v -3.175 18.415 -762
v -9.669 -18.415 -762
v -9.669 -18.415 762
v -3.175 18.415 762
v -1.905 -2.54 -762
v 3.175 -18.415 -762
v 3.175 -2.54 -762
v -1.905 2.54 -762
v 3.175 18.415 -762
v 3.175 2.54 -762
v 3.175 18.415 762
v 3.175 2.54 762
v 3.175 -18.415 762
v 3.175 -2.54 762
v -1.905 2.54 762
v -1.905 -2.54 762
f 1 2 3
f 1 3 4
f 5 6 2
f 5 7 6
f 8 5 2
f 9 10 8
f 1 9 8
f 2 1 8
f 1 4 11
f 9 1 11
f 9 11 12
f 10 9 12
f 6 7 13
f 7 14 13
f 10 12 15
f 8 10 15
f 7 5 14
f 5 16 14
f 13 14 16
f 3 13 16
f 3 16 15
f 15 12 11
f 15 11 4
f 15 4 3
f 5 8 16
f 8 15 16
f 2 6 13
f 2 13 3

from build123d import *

# Parameters (mm, degrees)
BOSS_EXTRUDE1_DEPTH = 762
BOSS_EXTRUDE2_START = -762
BOSS_EXTRUDE2_DEPTH = 1524


with BuildPart() as part:
    # Sketch1 → Boss-Extrude1 (new, symmetric)
    with BuildSketch(Plane.XY):
        Polygon((3.175, 2.54), (-1.905, 2.54), (-1.905, -2.54), (3.175, -2.54), (3.175, -18.415), (-3.175, -18.415), (-3.175, 18.415), (3.175, 18.415), align=None)
    extrude(amount=BOSS_EXTRUDE1_DEPTH, both=True)

    # Sketch2 → Boss-Extrude2 (add)
    with BuildSketch(Plane.XY.offset(BOSS_EXTRUDE2_START)):
        Polygon((-3.175, 18.415), (-3.175, -18.415), (-9.669122699, -18.415), align=None)
    extrude(amount=BOSS_EXTRUDE2_DEPTH)


solid = part.part
